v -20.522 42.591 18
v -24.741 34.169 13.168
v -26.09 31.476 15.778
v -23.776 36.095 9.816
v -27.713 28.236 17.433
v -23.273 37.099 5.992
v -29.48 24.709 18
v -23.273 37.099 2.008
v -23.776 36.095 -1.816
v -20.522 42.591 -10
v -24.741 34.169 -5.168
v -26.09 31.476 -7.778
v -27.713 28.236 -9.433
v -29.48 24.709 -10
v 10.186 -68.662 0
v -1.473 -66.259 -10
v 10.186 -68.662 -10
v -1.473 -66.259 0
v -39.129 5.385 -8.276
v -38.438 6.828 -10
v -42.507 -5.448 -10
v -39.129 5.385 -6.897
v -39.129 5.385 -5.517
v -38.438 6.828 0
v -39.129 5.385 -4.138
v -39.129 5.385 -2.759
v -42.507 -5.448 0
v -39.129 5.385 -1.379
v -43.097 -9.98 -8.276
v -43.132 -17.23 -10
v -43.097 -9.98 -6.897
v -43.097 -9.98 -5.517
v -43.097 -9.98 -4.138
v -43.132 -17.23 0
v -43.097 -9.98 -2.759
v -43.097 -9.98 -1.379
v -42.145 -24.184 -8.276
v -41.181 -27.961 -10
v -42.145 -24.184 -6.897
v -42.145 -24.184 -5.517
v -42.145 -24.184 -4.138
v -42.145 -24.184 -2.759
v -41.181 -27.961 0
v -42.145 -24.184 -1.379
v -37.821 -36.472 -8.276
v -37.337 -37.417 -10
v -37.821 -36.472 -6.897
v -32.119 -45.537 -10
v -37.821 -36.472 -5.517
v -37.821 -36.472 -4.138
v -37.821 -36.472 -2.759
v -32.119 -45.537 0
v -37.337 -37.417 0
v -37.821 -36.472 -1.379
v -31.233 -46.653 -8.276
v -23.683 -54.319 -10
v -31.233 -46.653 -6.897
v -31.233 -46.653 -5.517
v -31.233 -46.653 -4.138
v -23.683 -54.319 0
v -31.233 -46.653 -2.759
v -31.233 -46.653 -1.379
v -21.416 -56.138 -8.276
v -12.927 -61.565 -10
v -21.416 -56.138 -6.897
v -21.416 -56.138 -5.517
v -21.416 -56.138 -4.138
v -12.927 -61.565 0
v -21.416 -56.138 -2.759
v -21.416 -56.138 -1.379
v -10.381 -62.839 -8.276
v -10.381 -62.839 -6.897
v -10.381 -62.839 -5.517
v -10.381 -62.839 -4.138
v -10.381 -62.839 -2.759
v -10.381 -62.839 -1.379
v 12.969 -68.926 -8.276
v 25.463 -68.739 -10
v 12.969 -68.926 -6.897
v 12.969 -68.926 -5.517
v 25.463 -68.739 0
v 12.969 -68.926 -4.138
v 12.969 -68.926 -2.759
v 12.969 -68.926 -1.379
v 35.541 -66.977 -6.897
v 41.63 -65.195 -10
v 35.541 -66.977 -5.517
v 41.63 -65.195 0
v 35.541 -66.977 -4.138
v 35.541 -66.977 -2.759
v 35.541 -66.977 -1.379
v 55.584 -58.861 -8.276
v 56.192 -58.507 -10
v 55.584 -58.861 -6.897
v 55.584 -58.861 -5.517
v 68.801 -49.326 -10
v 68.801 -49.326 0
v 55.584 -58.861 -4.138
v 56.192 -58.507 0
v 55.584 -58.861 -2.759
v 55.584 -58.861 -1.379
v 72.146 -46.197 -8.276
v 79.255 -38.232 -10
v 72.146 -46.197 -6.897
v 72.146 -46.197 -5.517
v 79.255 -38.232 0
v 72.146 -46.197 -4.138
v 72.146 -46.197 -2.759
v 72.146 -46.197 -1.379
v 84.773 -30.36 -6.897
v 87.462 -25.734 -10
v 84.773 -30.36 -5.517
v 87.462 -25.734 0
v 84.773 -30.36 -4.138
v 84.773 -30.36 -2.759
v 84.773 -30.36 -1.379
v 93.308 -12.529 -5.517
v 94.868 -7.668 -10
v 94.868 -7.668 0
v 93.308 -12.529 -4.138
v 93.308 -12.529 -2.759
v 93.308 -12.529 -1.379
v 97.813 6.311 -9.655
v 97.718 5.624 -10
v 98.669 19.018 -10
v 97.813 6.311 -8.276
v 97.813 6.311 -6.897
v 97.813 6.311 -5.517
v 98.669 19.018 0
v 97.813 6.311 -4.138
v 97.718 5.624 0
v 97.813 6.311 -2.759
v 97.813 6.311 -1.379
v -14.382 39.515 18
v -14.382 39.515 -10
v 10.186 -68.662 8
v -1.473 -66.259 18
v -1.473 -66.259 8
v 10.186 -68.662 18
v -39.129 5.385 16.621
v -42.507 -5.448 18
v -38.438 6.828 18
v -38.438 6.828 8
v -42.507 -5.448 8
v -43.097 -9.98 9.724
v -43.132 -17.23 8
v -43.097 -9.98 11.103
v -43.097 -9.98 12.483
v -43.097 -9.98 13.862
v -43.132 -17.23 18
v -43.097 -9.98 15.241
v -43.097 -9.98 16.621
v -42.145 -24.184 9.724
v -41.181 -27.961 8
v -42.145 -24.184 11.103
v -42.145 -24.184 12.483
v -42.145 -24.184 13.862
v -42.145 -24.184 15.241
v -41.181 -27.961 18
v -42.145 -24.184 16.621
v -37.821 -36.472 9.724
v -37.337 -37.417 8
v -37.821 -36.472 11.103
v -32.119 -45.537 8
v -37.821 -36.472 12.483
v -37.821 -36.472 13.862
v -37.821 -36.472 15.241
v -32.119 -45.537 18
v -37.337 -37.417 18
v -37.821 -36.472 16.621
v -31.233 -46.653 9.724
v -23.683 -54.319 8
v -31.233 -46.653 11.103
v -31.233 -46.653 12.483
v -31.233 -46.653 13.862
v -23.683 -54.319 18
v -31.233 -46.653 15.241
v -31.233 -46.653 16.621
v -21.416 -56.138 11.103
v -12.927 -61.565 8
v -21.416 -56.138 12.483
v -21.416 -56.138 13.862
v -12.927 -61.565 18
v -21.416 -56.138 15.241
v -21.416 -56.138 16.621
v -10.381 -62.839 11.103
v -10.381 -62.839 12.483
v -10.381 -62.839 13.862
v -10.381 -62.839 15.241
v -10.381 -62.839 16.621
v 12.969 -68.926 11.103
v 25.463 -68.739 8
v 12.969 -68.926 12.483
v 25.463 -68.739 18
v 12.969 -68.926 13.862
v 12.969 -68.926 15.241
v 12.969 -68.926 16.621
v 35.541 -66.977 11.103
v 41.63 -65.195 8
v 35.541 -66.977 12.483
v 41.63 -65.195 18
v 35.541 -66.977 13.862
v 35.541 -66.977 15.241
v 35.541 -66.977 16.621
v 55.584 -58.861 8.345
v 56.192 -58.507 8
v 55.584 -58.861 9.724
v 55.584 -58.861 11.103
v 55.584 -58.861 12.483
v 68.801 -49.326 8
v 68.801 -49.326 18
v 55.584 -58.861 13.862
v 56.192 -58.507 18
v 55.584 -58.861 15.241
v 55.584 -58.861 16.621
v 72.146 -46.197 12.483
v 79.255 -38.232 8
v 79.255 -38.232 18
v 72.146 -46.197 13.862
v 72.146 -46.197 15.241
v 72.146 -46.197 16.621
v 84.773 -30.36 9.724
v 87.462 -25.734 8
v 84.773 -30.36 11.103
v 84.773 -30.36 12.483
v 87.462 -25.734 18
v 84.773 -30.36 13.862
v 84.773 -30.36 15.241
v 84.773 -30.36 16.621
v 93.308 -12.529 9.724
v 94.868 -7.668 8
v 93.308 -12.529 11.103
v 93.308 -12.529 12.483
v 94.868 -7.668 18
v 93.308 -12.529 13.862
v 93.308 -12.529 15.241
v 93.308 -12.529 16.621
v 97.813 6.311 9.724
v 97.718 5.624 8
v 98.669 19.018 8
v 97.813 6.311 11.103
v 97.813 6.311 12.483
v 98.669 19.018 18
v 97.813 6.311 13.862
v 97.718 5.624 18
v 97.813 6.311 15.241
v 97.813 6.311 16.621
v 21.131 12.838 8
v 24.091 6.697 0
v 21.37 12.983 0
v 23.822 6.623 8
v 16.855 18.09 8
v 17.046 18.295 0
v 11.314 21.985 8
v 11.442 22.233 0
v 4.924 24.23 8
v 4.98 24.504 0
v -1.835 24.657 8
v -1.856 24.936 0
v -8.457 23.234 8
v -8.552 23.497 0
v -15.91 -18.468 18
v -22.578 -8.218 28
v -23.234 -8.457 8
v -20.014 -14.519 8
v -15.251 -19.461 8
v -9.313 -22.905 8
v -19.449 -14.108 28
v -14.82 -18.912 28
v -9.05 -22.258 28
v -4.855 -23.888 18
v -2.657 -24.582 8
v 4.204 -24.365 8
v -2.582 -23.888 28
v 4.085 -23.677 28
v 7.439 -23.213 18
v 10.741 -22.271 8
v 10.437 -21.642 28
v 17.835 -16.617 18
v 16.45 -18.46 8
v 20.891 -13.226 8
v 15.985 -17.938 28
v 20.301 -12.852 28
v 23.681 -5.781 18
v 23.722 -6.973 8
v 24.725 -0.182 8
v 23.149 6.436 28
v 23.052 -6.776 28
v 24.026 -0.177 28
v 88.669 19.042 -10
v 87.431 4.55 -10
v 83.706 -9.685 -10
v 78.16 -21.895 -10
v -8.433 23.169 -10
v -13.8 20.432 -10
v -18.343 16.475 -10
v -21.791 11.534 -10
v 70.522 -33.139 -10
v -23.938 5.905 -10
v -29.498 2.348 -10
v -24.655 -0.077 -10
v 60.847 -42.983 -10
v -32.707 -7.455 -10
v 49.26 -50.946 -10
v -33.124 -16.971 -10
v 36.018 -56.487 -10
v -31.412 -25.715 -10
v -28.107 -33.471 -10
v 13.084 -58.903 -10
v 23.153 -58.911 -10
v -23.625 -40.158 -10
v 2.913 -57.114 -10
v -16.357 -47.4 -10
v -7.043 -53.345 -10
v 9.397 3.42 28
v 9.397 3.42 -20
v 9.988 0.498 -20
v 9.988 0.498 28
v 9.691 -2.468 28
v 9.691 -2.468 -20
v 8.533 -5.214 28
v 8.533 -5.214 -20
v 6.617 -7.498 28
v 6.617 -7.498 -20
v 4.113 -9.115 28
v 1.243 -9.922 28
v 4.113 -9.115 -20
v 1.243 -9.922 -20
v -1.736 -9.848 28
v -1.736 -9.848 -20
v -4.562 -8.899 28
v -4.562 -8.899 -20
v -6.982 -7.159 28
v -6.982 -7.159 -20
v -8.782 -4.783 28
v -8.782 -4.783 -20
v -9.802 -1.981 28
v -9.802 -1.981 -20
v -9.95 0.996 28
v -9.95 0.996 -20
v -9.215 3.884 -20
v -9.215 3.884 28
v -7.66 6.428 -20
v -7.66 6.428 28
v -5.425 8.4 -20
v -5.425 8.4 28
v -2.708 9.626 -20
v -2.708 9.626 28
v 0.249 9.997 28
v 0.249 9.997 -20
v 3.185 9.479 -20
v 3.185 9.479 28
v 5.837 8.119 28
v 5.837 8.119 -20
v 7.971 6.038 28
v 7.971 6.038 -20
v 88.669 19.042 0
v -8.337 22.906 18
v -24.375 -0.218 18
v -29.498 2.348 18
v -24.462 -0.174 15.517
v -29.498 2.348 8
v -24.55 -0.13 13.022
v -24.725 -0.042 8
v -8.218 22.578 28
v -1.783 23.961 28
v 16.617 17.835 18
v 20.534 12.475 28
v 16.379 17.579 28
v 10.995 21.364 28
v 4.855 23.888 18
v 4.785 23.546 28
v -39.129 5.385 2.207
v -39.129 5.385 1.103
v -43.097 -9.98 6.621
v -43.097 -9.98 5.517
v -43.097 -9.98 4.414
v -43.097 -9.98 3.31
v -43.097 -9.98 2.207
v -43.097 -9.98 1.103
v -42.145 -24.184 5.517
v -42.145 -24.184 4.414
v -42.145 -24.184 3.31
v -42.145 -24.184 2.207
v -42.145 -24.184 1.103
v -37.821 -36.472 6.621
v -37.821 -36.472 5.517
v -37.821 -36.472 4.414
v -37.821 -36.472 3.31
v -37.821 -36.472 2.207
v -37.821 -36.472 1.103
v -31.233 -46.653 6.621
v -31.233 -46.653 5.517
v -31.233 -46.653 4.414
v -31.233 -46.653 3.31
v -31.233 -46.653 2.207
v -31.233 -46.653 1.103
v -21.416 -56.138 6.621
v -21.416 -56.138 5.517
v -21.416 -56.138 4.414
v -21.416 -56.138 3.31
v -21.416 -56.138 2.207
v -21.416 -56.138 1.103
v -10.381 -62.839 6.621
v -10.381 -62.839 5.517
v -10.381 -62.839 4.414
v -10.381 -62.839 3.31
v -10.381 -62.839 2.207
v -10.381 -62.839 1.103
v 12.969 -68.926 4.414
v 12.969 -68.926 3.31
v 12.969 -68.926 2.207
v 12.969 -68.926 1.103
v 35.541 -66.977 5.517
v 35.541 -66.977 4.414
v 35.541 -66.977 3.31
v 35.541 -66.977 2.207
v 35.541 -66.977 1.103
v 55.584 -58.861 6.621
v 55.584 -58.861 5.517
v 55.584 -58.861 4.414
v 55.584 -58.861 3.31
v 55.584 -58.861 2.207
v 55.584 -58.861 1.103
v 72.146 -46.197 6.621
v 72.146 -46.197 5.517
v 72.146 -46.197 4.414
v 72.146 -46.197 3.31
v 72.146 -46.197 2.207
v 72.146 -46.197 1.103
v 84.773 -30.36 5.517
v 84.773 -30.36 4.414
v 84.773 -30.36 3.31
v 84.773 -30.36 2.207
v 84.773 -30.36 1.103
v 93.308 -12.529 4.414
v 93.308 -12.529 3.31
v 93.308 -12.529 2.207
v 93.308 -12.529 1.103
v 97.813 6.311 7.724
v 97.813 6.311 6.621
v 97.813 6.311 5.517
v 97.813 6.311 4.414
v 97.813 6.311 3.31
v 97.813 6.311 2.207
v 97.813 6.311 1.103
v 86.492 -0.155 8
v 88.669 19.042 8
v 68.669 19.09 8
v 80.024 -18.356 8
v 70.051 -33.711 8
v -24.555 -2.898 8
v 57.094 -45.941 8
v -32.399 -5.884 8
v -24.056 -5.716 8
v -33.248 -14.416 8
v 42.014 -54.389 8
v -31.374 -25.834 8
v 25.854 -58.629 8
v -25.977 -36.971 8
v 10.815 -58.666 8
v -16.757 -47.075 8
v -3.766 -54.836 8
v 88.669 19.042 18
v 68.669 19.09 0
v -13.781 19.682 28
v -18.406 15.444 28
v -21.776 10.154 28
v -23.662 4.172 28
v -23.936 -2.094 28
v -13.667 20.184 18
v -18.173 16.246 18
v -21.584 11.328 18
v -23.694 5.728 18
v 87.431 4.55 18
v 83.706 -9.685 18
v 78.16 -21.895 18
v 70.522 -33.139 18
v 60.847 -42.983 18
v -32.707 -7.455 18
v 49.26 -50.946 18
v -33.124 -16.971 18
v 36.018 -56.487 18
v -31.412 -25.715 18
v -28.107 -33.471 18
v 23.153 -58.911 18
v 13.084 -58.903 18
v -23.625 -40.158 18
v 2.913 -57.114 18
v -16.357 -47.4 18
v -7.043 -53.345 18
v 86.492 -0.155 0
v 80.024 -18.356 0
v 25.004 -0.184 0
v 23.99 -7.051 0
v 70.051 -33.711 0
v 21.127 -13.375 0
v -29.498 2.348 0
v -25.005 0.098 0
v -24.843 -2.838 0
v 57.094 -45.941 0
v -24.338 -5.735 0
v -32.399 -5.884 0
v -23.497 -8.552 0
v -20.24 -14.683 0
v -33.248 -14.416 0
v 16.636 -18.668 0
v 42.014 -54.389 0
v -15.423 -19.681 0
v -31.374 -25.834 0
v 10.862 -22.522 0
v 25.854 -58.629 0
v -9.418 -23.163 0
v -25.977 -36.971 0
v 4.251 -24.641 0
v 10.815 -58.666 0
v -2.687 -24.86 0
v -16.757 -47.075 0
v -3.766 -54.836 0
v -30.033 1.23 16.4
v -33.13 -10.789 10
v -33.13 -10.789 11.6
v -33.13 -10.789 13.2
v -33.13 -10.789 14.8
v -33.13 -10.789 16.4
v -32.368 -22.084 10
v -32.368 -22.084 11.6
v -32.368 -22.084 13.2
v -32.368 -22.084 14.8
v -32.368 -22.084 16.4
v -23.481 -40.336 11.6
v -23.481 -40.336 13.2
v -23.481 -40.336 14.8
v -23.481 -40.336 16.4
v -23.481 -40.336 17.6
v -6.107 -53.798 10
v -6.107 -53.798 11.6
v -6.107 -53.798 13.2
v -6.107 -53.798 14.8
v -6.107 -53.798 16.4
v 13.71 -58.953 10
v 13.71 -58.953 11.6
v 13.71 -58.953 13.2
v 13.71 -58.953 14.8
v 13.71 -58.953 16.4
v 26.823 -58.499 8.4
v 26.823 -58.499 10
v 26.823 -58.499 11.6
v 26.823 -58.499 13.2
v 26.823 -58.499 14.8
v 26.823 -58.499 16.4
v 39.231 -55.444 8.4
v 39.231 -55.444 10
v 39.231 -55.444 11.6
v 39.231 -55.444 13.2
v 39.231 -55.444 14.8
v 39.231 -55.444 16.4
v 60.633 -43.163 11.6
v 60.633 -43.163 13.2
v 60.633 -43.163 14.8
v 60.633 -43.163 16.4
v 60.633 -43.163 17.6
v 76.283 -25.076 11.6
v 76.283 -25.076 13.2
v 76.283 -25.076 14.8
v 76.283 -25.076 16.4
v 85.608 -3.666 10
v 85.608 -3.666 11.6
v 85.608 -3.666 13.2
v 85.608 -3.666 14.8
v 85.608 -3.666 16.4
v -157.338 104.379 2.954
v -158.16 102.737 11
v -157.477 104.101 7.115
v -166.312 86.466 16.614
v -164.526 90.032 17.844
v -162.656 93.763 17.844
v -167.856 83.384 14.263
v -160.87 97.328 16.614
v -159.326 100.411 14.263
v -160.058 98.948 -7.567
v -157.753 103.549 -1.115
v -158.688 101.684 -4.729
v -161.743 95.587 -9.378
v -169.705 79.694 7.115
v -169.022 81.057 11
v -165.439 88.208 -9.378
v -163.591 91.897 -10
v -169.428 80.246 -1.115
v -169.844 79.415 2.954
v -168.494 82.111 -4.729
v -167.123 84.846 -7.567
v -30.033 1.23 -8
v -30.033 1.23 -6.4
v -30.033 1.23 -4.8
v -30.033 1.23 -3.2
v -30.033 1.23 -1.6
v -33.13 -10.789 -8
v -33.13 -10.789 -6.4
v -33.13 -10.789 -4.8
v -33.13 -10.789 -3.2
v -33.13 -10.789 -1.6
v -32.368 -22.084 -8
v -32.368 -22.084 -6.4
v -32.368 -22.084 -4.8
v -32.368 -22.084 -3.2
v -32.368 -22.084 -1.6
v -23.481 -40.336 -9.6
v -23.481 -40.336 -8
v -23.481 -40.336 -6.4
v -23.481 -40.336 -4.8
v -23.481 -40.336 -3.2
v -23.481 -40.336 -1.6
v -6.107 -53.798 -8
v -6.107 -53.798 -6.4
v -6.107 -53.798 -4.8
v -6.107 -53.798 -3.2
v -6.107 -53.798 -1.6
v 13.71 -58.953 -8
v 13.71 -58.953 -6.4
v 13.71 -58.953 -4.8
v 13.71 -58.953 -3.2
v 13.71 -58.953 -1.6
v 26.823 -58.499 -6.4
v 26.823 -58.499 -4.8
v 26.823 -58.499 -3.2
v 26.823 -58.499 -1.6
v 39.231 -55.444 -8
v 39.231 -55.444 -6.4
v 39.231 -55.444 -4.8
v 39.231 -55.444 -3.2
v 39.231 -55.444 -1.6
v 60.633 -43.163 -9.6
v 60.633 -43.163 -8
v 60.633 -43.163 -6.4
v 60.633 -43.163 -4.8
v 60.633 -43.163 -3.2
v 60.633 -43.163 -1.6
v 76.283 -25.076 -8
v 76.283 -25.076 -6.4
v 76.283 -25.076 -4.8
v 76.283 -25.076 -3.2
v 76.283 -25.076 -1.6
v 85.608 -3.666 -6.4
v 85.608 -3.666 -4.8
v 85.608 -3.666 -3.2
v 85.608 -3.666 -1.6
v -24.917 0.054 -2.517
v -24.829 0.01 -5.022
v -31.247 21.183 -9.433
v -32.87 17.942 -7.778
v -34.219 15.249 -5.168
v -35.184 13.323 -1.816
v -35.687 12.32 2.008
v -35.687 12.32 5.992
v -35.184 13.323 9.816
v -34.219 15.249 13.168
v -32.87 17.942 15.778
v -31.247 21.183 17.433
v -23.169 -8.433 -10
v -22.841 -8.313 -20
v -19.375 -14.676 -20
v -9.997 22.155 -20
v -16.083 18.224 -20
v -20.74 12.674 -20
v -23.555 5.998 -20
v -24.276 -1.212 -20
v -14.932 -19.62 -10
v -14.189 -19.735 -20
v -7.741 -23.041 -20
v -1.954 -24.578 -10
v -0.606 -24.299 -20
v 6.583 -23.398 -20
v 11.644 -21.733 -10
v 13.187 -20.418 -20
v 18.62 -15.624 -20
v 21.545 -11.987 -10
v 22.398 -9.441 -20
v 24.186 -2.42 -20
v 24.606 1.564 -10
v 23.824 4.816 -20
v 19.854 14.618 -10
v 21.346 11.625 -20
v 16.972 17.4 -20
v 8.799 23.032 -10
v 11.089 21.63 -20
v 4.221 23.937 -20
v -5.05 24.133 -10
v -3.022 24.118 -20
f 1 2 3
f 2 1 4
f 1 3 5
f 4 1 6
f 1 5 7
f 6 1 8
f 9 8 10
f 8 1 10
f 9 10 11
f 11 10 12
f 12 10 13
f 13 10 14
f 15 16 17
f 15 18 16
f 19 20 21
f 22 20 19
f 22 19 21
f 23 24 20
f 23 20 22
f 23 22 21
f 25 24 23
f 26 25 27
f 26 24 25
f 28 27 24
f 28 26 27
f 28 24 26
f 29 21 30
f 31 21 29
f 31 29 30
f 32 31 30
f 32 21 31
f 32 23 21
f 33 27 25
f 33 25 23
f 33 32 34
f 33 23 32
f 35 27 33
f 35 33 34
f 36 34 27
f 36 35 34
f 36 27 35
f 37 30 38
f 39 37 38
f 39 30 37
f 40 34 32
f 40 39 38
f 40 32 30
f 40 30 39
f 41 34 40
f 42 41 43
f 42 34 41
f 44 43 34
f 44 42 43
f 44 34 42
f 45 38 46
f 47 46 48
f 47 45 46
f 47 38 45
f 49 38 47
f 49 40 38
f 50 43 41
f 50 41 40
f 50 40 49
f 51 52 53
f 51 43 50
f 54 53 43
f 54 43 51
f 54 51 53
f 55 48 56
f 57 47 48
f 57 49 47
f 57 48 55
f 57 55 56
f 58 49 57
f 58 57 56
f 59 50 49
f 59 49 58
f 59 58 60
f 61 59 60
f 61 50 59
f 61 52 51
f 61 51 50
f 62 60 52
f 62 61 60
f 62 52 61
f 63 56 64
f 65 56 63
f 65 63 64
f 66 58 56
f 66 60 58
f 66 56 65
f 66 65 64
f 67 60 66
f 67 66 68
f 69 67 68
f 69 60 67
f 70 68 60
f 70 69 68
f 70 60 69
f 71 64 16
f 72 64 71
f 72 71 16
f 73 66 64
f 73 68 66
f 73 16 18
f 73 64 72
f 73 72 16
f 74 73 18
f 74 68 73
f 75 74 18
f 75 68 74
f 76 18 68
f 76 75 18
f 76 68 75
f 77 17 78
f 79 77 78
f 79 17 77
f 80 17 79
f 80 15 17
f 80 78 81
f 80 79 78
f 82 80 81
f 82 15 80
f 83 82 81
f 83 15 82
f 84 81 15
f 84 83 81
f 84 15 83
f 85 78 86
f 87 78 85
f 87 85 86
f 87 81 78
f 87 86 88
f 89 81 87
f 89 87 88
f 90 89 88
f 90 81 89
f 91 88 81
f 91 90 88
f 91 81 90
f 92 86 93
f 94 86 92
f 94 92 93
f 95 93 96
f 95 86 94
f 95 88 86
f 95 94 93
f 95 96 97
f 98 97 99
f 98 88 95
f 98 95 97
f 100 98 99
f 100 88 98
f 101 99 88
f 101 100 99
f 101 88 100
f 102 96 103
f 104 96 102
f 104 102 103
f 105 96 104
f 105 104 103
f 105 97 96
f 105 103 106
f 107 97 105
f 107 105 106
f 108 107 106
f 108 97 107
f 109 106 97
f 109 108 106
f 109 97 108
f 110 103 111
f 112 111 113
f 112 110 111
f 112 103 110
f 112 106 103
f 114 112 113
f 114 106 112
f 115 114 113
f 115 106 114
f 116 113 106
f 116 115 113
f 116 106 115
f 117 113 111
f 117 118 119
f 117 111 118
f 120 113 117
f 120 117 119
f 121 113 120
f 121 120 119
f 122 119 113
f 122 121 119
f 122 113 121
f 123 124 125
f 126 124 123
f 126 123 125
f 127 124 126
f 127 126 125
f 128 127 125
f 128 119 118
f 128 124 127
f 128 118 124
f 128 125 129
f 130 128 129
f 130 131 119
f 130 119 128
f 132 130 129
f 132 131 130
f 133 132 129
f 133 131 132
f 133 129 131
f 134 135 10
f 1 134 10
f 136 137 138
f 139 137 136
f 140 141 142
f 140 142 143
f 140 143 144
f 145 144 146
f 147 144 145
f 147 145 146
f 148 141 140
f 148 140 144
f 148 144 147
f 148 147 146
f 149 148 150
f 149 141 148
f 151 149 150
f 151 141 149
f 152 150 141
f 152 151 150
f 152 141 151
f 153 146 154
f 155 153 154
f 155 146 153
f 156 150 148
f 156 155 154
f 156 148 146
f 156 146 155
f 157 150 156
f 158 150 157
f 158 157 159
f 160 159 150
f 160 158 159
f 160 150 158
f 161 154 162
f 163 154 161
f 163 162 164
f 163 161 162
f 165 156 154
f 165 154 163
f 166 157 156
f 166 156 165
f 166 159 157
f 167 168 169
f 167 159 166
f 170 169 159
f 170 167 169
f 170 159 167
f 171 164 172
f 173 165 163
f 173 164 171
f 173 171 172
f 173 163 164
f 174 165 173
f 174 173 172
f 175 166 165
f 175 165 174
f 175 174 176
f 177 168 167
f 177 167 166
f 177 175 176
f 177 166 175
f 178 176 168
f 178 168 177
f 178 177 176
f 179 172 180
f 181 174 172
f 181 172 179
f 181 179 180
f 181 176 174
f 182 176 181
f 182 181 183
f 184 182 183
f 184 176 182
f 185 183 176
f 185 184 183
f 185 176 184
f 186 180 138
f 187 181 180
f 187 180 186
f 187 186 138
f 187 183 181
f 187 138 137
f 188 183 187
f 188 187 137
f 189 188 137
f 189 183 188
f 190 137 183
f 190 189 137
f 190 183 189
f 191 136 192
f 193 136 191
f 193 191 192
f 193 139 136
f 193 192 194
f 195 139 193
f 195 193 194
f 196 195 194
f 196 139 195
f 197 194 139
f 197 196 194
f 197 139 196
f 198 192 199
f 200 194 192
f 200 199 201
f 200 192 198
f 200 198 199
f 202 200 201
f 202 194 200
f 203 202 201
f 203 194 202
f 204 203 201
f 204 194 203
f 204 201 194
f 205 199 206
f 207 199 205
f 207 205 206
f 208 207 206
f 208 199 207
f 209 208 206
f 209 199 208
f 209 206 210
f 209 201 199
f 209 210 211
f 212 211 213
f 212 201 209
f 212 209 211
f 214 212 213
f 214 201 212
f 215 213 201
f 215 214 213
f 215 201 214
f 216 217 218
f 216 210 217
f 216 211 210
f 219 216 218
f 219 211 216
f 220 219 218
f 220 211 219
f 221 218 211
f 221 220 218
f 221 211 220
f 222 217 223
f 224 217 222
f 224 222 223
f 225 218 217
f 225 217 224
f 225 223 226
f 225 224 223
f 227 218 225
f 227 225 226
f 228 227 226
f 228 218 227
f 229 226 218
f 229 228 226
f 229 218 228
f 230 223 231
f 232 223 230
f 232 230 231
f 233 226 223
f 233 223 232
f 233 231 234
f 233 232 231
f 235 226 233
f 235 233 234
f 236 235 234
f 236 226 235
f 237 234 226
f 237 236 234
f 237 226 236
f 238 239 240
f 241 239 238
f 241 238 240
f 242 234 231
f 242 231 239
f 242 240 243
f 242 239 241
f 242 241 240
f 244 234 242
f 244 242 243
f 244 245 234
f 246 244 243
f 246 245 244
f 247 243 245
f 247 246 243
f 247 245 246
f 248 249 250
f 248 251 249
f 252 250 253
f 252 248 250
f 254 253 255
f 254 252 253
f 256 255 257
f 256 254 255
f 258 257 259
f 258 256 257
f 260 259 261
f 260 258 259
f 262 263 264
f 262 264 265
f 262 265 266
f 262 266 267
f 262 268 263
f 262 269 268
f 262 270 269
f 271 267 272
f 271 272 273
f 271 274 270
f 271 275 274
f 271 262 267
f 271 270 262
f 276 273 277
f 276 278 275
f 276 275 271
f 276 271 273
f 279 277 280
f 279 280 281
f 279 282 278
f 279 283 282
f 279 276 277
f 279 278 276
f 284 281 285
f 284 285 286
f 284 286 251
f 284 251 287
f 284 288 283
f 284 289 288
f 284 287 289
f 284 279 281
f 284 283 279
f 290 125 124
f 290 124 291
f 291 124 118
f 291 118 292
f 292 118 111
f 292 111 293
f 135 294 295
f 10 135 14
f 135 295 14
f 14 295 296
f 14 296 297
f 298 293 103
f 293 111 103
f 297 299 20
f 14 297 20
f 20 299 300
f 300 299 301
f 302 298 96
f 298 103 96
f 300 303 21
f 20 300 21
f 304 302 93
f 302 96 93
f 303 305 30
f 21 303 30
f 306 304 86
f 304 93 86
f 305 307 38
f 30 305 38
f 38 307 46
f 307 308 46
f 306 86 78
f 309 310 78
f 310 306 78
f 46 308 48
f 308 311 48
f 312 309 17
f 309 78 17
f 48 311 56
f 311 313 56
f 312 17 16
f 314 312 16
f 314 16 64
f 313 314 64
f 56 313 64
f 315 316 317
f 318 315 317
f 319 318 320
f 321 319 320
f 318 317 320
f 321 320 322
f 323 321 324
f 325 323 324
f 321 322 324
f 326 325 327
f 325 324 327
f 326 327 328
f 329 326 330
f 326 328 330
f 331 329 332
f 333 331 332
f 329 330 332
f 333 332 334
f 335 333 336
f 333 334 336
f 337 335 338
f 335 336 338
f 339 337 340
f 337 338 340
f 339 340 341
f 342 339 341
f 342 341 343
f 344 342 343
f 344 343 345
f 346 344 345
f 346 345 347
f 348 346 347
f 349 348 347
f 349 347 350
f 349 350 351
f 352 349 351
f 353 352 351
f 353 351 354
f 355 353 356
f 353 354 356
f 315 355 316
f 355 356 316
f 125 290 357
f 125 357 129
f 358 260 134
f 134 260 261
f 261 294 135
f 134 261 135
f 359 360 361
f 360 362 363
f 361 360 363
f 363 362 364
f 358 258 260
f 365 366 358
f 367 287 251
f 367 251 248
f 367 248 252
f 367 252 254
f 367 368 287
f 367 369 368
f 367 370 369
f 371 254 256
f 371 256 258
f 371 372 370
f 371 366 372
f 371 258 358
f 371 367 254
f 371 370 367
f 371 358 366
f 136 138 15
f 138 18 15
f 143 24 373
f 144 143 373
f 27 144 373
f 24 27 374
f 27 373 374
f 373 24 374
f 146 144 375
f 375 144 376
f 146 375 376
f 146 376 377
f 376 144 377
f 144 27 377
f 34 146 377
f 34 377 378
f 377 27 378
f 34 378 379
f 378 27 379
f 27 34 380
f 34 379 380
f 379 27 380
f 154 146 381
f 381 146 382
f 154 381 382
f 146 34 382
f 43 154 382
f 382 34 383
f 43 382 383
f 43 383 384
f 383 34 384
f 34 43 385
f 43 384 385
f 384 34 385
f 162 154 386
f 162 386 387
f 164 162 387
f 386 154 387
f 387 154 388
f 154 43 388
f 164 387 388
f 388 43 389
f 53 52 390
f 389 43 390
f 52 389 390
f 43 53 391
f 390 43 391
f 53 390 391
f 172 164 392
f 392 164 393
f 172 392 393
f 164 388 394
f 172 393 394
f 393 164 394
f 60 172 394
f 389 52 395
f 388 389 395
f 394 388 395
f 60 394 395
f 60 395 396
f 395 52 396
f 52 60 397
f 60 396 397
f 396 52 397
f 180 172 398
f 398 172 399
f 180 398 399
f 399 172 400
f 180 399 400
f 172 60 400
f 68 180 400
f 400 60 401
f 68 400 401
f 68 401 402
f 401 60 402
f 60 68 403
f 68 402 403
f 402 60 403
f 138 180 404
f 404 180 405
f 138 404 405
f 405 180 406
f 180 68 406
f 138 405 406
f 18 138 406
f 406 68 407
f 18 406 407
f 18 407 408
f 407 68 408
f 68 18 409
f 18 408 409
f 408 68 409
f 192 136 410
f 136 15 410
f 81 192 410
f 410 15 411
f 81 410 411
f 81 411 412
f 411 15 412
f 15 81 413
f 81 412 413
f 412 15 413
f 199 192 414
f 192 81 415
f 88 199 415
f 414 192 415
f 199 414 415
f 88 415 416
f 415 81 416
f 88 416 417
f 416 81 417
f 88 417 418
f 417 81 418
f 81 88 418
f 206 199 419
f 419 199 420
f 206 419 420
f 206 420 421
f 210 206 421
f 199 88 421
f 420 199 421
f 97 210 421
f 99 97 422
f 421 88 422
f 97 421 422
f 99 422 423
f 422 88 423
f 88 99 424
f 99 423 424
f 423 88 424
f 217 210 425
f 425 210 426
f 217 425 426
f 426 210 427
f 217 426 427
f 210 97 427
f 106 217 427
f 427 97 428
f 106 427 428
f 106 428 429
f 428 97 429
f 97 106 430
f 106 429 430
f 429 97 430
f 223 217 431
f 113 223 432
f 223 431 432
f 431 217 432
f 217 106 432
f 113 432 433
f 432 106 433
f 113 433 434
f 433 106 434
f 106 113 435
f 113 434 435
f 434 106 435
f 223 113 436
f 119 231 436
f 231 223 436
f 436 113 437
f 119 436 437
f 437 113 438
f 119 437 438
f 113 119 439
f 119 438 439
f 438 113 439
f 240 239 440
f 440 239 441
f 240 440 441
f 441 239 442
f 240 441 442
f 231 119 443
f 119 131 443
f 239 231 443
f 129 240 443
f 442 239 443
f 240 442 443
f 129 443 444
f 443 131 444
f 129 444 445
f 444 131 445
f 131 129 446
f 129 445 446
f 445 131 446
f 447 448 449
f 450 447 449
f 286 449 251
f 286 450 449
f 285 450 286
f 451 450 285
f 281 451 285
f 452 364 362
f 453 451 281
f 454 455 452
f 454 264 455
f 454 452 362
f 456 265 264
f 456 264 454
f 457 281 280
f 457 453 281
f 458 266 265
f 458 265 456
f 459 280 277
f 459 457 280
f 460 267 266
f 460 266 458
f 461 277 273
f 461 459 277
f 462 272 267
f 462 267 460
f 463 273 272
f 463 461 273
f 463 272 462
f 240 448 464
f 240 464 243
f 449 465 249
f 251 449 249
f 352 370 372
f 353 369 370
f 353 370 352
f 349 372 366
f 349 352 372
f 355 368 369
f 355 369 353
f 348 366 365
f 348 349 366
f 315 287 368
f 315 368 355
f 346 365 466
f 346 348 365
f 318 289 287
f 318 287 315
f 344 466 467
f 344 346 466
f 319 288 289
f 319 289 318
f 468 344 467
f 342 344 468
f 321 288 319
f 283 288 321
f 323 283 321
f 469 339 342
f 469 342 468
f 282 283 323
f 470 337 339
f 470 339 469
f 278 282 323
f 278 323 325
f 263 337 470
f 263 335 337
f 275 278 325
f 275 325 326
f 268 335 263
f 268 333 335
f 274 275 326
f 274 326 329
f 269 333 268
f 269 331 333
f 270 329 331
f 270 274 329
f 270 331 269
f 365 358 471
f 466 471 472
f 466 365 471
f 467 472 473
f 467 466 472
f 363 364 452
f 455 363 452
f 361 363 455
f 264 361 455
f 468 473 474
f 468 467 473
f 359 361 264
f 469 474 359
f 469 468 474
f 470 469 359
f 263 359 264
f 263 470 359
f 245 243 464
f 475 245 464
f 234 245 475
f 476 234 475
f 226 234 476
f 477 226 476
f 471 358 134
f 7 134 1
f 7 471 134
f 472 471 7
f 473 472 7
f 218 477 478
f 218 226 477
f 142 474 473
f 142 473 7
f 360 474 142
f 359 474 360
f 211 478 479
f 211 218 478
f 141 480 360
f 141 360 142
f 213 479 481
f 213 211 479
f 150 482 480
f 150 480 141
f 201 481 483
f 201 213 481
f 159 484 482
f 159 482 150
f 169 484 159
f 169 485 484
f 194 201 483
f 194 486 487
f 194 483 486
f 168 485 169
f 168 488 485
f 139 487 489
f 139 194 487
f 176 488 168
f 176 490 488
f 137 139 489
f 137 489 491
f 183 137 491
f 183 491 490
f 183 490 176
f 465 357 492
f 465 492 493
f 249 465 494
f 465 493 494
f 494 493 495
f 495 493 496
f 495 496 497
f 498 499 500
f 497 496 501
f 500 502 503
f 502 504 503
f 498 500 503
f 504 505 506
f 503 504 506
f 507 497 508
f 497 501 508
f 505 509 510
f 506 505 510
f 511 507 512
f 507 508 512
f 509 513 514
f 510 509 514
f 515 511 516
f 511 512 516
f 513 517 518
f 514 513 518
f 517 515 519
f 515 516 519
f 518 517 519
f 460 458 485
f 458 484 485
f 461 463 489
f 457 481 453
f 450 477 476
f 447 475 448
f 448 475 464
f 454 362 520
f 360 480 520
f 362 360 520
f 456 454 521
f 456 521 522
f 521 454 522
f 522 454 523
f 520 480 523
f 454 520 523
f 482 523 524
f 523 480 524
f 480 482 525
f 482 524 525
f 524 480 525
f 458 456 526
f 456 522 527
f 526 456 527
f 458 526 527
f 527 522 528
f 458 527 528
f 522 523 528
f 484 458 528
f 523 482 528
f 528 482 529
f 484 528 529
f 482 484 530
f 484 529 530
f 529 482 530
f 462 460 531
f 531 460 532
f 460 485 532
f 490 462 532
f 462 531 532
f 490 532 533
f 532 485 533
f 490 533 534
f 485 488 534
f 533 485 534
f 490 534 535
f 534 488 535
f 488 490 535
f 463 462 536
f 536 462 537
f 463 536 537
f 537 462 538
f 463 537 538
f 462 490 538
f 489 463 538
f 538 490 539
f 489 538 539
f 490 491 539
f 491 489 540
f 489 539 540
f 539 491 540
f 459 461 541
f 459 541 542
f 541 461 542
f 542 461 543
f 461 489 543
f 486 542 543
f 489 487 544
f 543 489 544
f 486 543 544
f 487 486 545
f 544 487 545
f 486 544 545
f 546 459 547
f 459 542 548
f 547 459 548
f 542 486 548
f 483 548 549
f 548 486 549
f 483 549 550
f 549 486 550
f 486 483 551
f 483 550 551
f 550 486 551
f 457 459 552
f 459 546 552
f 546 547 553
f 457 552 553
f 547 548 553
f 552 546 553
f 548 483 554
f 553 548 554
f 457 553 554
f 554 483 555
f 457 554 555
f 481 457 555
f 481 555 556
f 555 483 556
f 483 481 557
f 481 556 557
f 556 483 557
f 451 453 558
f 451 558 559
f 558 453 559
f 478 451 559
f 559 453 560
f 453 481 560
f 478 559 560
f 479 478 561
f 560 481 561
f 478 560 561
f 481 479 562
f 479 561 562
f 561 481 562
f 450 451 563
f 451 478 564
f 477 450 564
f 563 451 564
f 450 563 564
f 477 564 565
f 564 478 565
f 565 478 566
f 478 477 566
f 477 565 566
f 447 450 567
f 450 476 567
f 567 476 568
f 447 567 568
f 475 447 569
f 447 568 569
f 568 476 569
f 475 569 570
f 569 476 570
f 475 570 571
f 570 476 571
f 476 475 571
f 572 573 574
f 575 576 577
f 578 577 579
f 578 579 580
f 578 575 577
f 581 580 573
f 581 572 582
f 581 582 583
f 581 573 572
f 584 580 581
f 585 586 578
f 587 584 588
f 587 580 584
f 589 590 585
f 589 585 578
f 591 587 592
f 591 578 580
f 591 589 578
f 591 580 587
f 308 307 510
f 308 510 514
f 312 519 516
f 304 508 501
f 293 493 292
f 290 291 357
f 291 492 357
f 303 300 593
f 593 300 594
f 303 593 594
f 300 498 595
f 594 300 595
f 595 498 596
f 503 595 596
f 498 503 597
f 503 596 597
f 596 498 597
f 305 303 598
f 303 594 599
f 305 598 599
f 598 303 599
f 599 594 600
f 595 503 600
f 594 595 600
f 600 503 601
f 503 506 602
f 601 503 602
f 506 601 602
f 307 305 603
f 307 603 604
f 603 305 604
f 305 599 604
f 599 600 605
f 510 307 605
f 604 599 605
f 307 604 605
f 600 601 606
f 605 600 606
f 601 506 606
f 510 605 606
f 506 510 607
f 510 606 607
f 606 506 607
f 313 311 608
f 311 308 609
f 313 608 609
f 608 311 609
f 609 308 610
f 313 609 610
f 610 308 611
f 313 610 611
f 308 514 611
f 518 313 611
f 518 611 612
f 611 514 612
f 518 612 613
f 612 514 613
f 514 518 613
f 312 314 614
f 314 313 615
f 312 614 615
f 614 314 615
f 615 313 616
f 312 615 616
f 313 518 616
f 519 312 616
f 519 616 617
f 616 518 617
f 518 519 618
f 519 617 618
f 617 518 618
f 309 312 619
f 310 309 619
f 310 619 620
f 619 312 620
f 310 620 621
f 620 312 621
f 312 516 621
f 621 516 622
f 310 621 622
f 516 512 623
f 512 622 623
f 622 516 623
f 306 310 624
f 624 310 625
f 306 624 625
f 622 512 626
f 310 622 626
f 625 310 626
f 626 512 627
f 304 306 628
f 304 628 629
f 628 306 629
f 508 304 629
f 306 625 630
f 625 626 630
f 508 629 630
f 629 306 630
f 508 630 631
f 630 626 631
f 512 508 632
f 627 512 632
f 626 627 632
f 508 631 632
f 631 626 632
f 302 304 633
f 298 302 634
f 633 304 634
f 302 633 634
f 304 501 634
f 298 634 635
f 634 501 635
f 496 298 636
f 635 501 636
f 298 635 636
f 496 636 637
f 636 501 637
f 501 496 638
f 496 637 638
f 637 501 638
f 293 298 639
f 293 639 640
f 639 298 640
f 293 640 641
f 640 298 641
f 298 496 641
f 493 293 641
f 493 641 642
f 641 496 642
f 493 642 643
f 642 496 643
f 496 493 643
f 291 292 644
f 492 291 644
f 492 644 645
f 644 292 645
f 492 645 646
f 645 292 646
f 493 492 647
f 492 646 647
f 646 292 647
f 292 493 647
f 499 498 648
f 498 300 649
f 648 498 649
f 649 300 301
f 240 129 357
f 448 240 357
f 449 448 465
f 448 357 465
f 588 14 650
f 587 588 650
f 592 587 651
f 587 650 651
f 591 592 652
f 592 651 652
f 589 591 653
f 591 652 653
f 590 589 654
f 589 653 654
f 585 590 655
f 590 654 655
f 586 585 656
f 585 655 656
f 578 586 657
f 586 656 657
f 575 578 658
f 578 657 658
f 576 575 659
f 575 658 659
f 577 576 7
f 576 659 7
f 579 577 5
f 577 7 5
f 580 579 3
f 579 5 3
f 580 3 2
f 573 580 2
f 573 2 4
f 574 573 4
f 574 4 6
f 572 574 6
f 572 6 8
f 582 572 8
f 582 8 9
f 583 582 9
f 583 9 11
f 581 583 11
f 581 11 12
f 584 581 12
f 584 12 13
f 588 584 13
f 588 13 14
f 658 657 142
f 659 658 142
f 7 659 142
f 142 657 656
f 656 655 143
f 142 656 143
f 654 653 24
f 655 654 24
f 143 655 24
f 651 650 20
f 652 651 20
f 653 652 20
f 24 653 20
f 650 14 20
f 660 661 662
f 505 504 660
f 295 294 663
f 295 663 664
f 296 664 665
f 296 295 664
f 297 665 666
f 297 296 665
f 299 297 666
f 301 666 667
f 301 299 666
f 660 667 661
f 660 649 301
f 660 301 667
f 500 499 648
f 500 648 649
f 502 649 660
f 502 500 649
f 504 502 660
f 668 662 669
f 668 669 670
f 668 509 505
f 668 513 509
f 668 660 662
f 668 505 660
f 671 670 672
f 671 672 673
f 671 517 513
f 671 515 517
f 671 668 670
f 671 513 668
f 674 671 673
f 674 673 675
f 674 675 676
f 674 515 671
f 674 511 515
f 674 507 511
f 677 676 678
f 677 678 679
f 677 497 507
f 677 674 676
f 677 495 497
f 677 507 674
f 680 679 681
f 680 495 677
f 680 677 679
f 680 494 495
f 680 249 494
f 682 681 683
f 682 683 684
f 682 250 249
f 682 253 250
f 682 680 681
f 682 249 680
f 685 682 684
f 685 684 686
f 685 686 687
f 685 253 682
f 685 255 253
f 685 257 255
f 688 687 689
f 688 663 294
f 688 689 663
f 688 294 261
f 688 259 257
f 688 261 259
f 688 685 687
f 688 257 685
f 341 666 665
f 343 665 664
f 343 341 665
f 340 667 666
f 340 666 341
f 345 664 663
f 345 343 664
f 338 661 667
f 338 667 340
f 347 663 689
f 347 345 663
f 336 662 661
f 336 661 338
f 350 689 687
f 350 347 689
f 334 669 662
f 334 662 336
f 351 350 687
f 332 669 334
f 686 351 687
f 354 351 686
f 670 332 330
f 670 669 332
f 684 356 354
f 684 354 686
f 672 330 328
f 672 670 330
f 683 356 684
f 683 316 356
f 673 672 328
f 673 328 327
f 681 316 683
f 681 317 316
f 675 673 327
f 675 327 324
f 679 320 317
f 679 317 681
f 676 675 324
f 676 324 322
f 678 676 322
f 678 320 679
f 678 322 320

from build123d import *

# Parameters (mm, degrees)
SKETCH_1_R           = 10.000000001
EXTRUDE_1_DEPTH      = 8
EXTRUDE_2_DEPTH      = 10
EXTRUDE_2_DEPTH_BACK = 18
EXTRUDE_4_DEPTH      = 20
EXTRUDE_4_TAPER      = 2
SKETCH_5_R           = 10
CUT_EXTRUDE_1_DEPTH  = 48
EXTRUDE_START        = -14
EXTRUDE_5_DEPTH      = 28
SKETCH_7_R           = 14
EXTRUDE_6_DEPTH      = 150
MOVE_BODY_1_ANGLE    = 160


# Read off the part's stored shape, not the designer's step: 凸台-拉伸3, 凸台-拉伸5
with BuildPart() as part:
    # 草图1 → 凸台-拉伸1 (new body)
    with BuildSketch(Plane.XY):
        Circle(SKETCH_1_R)
        with BuildLine():
            Line((-99.223415369, 15.875832346), (-71.057498037, 5.54717799))
            Line((-71.057498037, 5.54717799), (0, 0))
            Line((0, 0), (0, -25.00478934))
            Line((0, -25.00478934), (23.416407848, -26.832815739))
            add(Edge.make_bspline(
                [(23.416407848, -26.832815739), (23.559255777, -26.761391774), (23.857489252, -26.609782504), (24.343322546, -26.356143142), (25.001847908, -26.00202666), (25.895002872, -25.493833349), (26.689827796, -25.015527515), (27.443014709, -24.541367746), (28.44946677, -23.878396743), (30.180130615, -22.657518607), (32.463639395, -20.822910489), (35.803918719, -17.675778925), (39.356057937, -13.452382092), (43.810657679, -6.319948363), (47.26514501, 2.912424346), (48.687565133, 13.74600062), (47.956016905, 23.948129205), (45.527543401, 33.31383343), (41.766058602, 41.743075171), (35.35780408, 51.679214297), (25.341292826, 61.631560208), (11.525255636, 69.785622537), (-3.116720541, 74.453616351), (-17.875896804, 75.980775652), (-32.230785273, 74.726921151), (-50.32340393, 69.819482921), (-70.232141124, 58.486051284), (-85.364335796, 42.337960666), (-93.213462614, 29.471917912), (-96.911556554, 21.787367795), (-98.494293842, 17.864123943), (-99.223415369, 15.875832346)],
                knots=[0.039541182, 0.039541182, 0.039541182, 0.039541182, 0.040360106, 0.04117903, 0.042816878, 0.044454725, 0.046092573, 0.047730421, 0.049368269, 0.052643964, 0.059195355, 0.065746746, 0.078849528, 0.091952311, 0.118157875, 0.144363439, 0.170569003, 0.196774568, 0.222980132, 0.249185696, 0.301596825, 0.354007953, 0.406419082, 0.45883021, 0.511241339, 0.563652467, 0.668474724, 0.773296981, 0.82570811, 0.851913674, 0.878119238, 0.878119238, 0.878119238, 0.878119238], degree=3))
        make_face()
    extrude(amount=EXTRUDE_1_DEPTH)

    # 草图2 → 凸台-拉伸2 (add, two sides: drawn at the far end of the back side and taken through both)
    with BuildSketch(Plane(origin=(0, 0, 0), x_dir=(-1, 0, 0), z_dir=(0, 0, -1)).offset(-EXTRUDE_2_DEPTH_BACK)):
        with BuildLine():
            Line((-23.416407848, -26.832815739), (-18.944271899, -17.888543826))
            add(Edge.make_bspline(
                [(-18.944271899, -17.888543826), (-19.052705032, -17.834327259), (-19.279014375, -17.71924736), (-19.648152988, -17.526510294), (-20.157464576, -17.252862811), (-20.848872628, -16.859261983), (-21.642713236, -16.38143627), (-22.609327917, -15.759508594), (-24.135094314, -14.683161103), (-25.88889207, -13.274264185), (-28.481097704, -10.832666814), (-31.239689124, -7.553621002), (-34.737099736, -1.958117593), (-37.47574582, 5.346529302), (-38.623443824, 14.038278874), (-38.034234701, 22.314418593), (-35.383511893, 32.549710241), (-29.284340235, 43.56584113), (-19.178025873, 53.624814399), (-7.415995151, 60.576443845), (5.163786787, 64.593266285), (22.211265662, 66.362987302), (42.815452692, 62.532491918), (63.927151805, 50.528041572), (77.41272726, 36.156200275), (85.445738505, 22.987041434), (88.522694561, 16.010953304), (89.834776258, 12.432947561)],
                knots=[0.039541182, 0.039541182, 0.039541182, 0.039541182, 0.040360106, 0.04117903, 0.042816878, 0.044454725, 0.046092573, 0.049368269, 0.052643964, 0.059195355, 0.065746746, 0.078849528, 0.091952311, 0.118157875, 0.144363439, 0.170569003, 0.196774568, 0.249185696, 0.301596825, 0.354007953, 0.406419082, 0.45883021, 0.563652467, 0.668474724, 0.773296981, 0.82570811, 0.878119238, 0.878119238, 0.878119238, 0.878119238], degree=3))
            Line((89.834776258, 12.432947561), (99.223415369, 15.875832346))
            add(Edge.make_bspline(
                [(-23.416407848, -26.832815739), (-23.559255777, -26.761391774), (-23.857489252, -26.609782504), (-24.343322546, -26.356143142), (-25.001847908, -26.00202666), (-25.895002872, -25.493833349), (-26.689827796, -25.015527515), (-27.443014709, -24.541367746), (-28.44946677, -23.878396743), (-30.180130615, -22.657518607), (-32.463639395, -20.822910489), (-35.803918719, -17.675778925), (-39.356057937, -13.452382092), (-43.810657679, -6.319948363), (-47.26514501, 2.912424346), (-48.687565133, 13.74600062), (-47.956016905, 23.948129205), (-45.527543401, 33.31383343), (-41.766058602, 41.743075171), (-35.35780408, 51.679214297), (-25.341292826, 61.631560208), (-11.525255636, 69.785622537), (3.116720541, 74.453616351), (17.875896804, 75.980775652), (32.230785273, 74.726921151), (50.32340393, 69.819482921), (70.232141124, 58.486051284), (85.364335796, 42.337960666), (93.213462614, 29.471917912), (96.911556554, 21.787367795), (98.494293842, 17.864123943), (99.223415369, 15.875832346)],
                knots=[0.039541182, 0.039541182, 0.039541182, 0.039541182, 0.040360106, 0.04117903, 0.042816878, 0.044454725, 0.046092573, 0.047730421, 0.049368269, 0.052643964, 0.059195355, 0.065746746, 0.078849528, 0.091952311, 0.118157875, 0.144363439, 0.170569003, 0.196774568, 0.222980132, 0.249185696, 0.301596825, 0.354007953, 0.406419082, 0.45883021, 0.511241339, 0.563652467, 0.668474724, 0.773296981, 0.82570811, 0.851913674, 0.878119238, 0.878119238, 0.878119238, 0.878119238], degree=3))
        make_face()
    extrude(amount=EXTRUDE_2_DEPTH + EXTRUDE_2_DEPTH_BACK)

    # 凸台-拉伸3 outline → 凸台-拉伸3 (revolve)
    with BuildSketch(Plane.XZ):
        Polygon((10.000000001, 8), (10.000000001, 0), (0, 0), (0, -20), (24.306373953, -20), (25.004789342, 0), (24.725423186, 8), align=None)
    revolve(axis=Axis((0, 0, 0), (0, 0, 1)))

    # 草图4 → 凸台-拉伸4 (add)
    with BuildSketch(Plane.XY.offset(8)):
        with BuildLine():
            ThreePointArc((24.725423186, 0), (0.962911043, 24.706666187), (-24.650423647, 1.924361134))
            ThreePointArc((-24.650423647, 1.924361134), (-18.151132129, -16.789370273), (0, -24.725423186))
            ThreePointArc((0, -24.725423186), (17.483514403, -17.483514403), (24.725423186, 0))
        make_face()
    extrude(amount=EXTRUDE_4_DEPTH, taper=EXTRUDE_4_TAPER)

    # 草图5 → 切除-拉伸1 (cut)
    with BuildSketch(Plane(origin=(0, 0, -20), x_dir=(-1, 0, 0), z_dir=(0, 0, -1))):
        Circle(SKETCH_5_R)
    extrude(amount=-CUT_EXTRUDE_1_DEPTH, mode=Mode.SUBTRACT)

    # 凸台-拉伸5 outline → 凸台-拉伸5 (add)
    with BuildSketch(Plane.XY.offset(4).offset(EXTRUDE_START)):
        with BuildLine():
            Line((0, -42.050906086), (4.717060846, -47.040869425))
            Line((4.717060846, -47.040869425), (33.785028526, -19.562637042))
            Line((33.785028526, -19.562637042), (22.709671659, -7.846522593))
            ThreePointArc((22.709671659, -7.846522593), (13.94217781, -19.568157337), (0, -24.027007797))
            Line((0, -24.027007797), (0, -42.050906086))
        make_face()
    extrude(amount=EXTRUDE_5_DEPTH)

    # 草图7 → 凸台-拉伸6 (add)
    with BuildSketch(Plane(origin=(25.70930342, -27.19669848, 0), x_dir=(0, 0, -1), z_dir=(0.6869558095891056, -0.7266991920126075, 0))):
        with Locations((-4, -8.887114234)):
            Circle(SKETCH_7_R)
    extrude(amount=EXTRUDE_6_DEPTH)


with BuildPart() as part_1:
    # Move Body 1: moved
    add(part.part.rotate(Axis((0, 0, 0), (0, 0, -1)), MOVE_BODY_1_ANGLE))


solid = part_1.part
